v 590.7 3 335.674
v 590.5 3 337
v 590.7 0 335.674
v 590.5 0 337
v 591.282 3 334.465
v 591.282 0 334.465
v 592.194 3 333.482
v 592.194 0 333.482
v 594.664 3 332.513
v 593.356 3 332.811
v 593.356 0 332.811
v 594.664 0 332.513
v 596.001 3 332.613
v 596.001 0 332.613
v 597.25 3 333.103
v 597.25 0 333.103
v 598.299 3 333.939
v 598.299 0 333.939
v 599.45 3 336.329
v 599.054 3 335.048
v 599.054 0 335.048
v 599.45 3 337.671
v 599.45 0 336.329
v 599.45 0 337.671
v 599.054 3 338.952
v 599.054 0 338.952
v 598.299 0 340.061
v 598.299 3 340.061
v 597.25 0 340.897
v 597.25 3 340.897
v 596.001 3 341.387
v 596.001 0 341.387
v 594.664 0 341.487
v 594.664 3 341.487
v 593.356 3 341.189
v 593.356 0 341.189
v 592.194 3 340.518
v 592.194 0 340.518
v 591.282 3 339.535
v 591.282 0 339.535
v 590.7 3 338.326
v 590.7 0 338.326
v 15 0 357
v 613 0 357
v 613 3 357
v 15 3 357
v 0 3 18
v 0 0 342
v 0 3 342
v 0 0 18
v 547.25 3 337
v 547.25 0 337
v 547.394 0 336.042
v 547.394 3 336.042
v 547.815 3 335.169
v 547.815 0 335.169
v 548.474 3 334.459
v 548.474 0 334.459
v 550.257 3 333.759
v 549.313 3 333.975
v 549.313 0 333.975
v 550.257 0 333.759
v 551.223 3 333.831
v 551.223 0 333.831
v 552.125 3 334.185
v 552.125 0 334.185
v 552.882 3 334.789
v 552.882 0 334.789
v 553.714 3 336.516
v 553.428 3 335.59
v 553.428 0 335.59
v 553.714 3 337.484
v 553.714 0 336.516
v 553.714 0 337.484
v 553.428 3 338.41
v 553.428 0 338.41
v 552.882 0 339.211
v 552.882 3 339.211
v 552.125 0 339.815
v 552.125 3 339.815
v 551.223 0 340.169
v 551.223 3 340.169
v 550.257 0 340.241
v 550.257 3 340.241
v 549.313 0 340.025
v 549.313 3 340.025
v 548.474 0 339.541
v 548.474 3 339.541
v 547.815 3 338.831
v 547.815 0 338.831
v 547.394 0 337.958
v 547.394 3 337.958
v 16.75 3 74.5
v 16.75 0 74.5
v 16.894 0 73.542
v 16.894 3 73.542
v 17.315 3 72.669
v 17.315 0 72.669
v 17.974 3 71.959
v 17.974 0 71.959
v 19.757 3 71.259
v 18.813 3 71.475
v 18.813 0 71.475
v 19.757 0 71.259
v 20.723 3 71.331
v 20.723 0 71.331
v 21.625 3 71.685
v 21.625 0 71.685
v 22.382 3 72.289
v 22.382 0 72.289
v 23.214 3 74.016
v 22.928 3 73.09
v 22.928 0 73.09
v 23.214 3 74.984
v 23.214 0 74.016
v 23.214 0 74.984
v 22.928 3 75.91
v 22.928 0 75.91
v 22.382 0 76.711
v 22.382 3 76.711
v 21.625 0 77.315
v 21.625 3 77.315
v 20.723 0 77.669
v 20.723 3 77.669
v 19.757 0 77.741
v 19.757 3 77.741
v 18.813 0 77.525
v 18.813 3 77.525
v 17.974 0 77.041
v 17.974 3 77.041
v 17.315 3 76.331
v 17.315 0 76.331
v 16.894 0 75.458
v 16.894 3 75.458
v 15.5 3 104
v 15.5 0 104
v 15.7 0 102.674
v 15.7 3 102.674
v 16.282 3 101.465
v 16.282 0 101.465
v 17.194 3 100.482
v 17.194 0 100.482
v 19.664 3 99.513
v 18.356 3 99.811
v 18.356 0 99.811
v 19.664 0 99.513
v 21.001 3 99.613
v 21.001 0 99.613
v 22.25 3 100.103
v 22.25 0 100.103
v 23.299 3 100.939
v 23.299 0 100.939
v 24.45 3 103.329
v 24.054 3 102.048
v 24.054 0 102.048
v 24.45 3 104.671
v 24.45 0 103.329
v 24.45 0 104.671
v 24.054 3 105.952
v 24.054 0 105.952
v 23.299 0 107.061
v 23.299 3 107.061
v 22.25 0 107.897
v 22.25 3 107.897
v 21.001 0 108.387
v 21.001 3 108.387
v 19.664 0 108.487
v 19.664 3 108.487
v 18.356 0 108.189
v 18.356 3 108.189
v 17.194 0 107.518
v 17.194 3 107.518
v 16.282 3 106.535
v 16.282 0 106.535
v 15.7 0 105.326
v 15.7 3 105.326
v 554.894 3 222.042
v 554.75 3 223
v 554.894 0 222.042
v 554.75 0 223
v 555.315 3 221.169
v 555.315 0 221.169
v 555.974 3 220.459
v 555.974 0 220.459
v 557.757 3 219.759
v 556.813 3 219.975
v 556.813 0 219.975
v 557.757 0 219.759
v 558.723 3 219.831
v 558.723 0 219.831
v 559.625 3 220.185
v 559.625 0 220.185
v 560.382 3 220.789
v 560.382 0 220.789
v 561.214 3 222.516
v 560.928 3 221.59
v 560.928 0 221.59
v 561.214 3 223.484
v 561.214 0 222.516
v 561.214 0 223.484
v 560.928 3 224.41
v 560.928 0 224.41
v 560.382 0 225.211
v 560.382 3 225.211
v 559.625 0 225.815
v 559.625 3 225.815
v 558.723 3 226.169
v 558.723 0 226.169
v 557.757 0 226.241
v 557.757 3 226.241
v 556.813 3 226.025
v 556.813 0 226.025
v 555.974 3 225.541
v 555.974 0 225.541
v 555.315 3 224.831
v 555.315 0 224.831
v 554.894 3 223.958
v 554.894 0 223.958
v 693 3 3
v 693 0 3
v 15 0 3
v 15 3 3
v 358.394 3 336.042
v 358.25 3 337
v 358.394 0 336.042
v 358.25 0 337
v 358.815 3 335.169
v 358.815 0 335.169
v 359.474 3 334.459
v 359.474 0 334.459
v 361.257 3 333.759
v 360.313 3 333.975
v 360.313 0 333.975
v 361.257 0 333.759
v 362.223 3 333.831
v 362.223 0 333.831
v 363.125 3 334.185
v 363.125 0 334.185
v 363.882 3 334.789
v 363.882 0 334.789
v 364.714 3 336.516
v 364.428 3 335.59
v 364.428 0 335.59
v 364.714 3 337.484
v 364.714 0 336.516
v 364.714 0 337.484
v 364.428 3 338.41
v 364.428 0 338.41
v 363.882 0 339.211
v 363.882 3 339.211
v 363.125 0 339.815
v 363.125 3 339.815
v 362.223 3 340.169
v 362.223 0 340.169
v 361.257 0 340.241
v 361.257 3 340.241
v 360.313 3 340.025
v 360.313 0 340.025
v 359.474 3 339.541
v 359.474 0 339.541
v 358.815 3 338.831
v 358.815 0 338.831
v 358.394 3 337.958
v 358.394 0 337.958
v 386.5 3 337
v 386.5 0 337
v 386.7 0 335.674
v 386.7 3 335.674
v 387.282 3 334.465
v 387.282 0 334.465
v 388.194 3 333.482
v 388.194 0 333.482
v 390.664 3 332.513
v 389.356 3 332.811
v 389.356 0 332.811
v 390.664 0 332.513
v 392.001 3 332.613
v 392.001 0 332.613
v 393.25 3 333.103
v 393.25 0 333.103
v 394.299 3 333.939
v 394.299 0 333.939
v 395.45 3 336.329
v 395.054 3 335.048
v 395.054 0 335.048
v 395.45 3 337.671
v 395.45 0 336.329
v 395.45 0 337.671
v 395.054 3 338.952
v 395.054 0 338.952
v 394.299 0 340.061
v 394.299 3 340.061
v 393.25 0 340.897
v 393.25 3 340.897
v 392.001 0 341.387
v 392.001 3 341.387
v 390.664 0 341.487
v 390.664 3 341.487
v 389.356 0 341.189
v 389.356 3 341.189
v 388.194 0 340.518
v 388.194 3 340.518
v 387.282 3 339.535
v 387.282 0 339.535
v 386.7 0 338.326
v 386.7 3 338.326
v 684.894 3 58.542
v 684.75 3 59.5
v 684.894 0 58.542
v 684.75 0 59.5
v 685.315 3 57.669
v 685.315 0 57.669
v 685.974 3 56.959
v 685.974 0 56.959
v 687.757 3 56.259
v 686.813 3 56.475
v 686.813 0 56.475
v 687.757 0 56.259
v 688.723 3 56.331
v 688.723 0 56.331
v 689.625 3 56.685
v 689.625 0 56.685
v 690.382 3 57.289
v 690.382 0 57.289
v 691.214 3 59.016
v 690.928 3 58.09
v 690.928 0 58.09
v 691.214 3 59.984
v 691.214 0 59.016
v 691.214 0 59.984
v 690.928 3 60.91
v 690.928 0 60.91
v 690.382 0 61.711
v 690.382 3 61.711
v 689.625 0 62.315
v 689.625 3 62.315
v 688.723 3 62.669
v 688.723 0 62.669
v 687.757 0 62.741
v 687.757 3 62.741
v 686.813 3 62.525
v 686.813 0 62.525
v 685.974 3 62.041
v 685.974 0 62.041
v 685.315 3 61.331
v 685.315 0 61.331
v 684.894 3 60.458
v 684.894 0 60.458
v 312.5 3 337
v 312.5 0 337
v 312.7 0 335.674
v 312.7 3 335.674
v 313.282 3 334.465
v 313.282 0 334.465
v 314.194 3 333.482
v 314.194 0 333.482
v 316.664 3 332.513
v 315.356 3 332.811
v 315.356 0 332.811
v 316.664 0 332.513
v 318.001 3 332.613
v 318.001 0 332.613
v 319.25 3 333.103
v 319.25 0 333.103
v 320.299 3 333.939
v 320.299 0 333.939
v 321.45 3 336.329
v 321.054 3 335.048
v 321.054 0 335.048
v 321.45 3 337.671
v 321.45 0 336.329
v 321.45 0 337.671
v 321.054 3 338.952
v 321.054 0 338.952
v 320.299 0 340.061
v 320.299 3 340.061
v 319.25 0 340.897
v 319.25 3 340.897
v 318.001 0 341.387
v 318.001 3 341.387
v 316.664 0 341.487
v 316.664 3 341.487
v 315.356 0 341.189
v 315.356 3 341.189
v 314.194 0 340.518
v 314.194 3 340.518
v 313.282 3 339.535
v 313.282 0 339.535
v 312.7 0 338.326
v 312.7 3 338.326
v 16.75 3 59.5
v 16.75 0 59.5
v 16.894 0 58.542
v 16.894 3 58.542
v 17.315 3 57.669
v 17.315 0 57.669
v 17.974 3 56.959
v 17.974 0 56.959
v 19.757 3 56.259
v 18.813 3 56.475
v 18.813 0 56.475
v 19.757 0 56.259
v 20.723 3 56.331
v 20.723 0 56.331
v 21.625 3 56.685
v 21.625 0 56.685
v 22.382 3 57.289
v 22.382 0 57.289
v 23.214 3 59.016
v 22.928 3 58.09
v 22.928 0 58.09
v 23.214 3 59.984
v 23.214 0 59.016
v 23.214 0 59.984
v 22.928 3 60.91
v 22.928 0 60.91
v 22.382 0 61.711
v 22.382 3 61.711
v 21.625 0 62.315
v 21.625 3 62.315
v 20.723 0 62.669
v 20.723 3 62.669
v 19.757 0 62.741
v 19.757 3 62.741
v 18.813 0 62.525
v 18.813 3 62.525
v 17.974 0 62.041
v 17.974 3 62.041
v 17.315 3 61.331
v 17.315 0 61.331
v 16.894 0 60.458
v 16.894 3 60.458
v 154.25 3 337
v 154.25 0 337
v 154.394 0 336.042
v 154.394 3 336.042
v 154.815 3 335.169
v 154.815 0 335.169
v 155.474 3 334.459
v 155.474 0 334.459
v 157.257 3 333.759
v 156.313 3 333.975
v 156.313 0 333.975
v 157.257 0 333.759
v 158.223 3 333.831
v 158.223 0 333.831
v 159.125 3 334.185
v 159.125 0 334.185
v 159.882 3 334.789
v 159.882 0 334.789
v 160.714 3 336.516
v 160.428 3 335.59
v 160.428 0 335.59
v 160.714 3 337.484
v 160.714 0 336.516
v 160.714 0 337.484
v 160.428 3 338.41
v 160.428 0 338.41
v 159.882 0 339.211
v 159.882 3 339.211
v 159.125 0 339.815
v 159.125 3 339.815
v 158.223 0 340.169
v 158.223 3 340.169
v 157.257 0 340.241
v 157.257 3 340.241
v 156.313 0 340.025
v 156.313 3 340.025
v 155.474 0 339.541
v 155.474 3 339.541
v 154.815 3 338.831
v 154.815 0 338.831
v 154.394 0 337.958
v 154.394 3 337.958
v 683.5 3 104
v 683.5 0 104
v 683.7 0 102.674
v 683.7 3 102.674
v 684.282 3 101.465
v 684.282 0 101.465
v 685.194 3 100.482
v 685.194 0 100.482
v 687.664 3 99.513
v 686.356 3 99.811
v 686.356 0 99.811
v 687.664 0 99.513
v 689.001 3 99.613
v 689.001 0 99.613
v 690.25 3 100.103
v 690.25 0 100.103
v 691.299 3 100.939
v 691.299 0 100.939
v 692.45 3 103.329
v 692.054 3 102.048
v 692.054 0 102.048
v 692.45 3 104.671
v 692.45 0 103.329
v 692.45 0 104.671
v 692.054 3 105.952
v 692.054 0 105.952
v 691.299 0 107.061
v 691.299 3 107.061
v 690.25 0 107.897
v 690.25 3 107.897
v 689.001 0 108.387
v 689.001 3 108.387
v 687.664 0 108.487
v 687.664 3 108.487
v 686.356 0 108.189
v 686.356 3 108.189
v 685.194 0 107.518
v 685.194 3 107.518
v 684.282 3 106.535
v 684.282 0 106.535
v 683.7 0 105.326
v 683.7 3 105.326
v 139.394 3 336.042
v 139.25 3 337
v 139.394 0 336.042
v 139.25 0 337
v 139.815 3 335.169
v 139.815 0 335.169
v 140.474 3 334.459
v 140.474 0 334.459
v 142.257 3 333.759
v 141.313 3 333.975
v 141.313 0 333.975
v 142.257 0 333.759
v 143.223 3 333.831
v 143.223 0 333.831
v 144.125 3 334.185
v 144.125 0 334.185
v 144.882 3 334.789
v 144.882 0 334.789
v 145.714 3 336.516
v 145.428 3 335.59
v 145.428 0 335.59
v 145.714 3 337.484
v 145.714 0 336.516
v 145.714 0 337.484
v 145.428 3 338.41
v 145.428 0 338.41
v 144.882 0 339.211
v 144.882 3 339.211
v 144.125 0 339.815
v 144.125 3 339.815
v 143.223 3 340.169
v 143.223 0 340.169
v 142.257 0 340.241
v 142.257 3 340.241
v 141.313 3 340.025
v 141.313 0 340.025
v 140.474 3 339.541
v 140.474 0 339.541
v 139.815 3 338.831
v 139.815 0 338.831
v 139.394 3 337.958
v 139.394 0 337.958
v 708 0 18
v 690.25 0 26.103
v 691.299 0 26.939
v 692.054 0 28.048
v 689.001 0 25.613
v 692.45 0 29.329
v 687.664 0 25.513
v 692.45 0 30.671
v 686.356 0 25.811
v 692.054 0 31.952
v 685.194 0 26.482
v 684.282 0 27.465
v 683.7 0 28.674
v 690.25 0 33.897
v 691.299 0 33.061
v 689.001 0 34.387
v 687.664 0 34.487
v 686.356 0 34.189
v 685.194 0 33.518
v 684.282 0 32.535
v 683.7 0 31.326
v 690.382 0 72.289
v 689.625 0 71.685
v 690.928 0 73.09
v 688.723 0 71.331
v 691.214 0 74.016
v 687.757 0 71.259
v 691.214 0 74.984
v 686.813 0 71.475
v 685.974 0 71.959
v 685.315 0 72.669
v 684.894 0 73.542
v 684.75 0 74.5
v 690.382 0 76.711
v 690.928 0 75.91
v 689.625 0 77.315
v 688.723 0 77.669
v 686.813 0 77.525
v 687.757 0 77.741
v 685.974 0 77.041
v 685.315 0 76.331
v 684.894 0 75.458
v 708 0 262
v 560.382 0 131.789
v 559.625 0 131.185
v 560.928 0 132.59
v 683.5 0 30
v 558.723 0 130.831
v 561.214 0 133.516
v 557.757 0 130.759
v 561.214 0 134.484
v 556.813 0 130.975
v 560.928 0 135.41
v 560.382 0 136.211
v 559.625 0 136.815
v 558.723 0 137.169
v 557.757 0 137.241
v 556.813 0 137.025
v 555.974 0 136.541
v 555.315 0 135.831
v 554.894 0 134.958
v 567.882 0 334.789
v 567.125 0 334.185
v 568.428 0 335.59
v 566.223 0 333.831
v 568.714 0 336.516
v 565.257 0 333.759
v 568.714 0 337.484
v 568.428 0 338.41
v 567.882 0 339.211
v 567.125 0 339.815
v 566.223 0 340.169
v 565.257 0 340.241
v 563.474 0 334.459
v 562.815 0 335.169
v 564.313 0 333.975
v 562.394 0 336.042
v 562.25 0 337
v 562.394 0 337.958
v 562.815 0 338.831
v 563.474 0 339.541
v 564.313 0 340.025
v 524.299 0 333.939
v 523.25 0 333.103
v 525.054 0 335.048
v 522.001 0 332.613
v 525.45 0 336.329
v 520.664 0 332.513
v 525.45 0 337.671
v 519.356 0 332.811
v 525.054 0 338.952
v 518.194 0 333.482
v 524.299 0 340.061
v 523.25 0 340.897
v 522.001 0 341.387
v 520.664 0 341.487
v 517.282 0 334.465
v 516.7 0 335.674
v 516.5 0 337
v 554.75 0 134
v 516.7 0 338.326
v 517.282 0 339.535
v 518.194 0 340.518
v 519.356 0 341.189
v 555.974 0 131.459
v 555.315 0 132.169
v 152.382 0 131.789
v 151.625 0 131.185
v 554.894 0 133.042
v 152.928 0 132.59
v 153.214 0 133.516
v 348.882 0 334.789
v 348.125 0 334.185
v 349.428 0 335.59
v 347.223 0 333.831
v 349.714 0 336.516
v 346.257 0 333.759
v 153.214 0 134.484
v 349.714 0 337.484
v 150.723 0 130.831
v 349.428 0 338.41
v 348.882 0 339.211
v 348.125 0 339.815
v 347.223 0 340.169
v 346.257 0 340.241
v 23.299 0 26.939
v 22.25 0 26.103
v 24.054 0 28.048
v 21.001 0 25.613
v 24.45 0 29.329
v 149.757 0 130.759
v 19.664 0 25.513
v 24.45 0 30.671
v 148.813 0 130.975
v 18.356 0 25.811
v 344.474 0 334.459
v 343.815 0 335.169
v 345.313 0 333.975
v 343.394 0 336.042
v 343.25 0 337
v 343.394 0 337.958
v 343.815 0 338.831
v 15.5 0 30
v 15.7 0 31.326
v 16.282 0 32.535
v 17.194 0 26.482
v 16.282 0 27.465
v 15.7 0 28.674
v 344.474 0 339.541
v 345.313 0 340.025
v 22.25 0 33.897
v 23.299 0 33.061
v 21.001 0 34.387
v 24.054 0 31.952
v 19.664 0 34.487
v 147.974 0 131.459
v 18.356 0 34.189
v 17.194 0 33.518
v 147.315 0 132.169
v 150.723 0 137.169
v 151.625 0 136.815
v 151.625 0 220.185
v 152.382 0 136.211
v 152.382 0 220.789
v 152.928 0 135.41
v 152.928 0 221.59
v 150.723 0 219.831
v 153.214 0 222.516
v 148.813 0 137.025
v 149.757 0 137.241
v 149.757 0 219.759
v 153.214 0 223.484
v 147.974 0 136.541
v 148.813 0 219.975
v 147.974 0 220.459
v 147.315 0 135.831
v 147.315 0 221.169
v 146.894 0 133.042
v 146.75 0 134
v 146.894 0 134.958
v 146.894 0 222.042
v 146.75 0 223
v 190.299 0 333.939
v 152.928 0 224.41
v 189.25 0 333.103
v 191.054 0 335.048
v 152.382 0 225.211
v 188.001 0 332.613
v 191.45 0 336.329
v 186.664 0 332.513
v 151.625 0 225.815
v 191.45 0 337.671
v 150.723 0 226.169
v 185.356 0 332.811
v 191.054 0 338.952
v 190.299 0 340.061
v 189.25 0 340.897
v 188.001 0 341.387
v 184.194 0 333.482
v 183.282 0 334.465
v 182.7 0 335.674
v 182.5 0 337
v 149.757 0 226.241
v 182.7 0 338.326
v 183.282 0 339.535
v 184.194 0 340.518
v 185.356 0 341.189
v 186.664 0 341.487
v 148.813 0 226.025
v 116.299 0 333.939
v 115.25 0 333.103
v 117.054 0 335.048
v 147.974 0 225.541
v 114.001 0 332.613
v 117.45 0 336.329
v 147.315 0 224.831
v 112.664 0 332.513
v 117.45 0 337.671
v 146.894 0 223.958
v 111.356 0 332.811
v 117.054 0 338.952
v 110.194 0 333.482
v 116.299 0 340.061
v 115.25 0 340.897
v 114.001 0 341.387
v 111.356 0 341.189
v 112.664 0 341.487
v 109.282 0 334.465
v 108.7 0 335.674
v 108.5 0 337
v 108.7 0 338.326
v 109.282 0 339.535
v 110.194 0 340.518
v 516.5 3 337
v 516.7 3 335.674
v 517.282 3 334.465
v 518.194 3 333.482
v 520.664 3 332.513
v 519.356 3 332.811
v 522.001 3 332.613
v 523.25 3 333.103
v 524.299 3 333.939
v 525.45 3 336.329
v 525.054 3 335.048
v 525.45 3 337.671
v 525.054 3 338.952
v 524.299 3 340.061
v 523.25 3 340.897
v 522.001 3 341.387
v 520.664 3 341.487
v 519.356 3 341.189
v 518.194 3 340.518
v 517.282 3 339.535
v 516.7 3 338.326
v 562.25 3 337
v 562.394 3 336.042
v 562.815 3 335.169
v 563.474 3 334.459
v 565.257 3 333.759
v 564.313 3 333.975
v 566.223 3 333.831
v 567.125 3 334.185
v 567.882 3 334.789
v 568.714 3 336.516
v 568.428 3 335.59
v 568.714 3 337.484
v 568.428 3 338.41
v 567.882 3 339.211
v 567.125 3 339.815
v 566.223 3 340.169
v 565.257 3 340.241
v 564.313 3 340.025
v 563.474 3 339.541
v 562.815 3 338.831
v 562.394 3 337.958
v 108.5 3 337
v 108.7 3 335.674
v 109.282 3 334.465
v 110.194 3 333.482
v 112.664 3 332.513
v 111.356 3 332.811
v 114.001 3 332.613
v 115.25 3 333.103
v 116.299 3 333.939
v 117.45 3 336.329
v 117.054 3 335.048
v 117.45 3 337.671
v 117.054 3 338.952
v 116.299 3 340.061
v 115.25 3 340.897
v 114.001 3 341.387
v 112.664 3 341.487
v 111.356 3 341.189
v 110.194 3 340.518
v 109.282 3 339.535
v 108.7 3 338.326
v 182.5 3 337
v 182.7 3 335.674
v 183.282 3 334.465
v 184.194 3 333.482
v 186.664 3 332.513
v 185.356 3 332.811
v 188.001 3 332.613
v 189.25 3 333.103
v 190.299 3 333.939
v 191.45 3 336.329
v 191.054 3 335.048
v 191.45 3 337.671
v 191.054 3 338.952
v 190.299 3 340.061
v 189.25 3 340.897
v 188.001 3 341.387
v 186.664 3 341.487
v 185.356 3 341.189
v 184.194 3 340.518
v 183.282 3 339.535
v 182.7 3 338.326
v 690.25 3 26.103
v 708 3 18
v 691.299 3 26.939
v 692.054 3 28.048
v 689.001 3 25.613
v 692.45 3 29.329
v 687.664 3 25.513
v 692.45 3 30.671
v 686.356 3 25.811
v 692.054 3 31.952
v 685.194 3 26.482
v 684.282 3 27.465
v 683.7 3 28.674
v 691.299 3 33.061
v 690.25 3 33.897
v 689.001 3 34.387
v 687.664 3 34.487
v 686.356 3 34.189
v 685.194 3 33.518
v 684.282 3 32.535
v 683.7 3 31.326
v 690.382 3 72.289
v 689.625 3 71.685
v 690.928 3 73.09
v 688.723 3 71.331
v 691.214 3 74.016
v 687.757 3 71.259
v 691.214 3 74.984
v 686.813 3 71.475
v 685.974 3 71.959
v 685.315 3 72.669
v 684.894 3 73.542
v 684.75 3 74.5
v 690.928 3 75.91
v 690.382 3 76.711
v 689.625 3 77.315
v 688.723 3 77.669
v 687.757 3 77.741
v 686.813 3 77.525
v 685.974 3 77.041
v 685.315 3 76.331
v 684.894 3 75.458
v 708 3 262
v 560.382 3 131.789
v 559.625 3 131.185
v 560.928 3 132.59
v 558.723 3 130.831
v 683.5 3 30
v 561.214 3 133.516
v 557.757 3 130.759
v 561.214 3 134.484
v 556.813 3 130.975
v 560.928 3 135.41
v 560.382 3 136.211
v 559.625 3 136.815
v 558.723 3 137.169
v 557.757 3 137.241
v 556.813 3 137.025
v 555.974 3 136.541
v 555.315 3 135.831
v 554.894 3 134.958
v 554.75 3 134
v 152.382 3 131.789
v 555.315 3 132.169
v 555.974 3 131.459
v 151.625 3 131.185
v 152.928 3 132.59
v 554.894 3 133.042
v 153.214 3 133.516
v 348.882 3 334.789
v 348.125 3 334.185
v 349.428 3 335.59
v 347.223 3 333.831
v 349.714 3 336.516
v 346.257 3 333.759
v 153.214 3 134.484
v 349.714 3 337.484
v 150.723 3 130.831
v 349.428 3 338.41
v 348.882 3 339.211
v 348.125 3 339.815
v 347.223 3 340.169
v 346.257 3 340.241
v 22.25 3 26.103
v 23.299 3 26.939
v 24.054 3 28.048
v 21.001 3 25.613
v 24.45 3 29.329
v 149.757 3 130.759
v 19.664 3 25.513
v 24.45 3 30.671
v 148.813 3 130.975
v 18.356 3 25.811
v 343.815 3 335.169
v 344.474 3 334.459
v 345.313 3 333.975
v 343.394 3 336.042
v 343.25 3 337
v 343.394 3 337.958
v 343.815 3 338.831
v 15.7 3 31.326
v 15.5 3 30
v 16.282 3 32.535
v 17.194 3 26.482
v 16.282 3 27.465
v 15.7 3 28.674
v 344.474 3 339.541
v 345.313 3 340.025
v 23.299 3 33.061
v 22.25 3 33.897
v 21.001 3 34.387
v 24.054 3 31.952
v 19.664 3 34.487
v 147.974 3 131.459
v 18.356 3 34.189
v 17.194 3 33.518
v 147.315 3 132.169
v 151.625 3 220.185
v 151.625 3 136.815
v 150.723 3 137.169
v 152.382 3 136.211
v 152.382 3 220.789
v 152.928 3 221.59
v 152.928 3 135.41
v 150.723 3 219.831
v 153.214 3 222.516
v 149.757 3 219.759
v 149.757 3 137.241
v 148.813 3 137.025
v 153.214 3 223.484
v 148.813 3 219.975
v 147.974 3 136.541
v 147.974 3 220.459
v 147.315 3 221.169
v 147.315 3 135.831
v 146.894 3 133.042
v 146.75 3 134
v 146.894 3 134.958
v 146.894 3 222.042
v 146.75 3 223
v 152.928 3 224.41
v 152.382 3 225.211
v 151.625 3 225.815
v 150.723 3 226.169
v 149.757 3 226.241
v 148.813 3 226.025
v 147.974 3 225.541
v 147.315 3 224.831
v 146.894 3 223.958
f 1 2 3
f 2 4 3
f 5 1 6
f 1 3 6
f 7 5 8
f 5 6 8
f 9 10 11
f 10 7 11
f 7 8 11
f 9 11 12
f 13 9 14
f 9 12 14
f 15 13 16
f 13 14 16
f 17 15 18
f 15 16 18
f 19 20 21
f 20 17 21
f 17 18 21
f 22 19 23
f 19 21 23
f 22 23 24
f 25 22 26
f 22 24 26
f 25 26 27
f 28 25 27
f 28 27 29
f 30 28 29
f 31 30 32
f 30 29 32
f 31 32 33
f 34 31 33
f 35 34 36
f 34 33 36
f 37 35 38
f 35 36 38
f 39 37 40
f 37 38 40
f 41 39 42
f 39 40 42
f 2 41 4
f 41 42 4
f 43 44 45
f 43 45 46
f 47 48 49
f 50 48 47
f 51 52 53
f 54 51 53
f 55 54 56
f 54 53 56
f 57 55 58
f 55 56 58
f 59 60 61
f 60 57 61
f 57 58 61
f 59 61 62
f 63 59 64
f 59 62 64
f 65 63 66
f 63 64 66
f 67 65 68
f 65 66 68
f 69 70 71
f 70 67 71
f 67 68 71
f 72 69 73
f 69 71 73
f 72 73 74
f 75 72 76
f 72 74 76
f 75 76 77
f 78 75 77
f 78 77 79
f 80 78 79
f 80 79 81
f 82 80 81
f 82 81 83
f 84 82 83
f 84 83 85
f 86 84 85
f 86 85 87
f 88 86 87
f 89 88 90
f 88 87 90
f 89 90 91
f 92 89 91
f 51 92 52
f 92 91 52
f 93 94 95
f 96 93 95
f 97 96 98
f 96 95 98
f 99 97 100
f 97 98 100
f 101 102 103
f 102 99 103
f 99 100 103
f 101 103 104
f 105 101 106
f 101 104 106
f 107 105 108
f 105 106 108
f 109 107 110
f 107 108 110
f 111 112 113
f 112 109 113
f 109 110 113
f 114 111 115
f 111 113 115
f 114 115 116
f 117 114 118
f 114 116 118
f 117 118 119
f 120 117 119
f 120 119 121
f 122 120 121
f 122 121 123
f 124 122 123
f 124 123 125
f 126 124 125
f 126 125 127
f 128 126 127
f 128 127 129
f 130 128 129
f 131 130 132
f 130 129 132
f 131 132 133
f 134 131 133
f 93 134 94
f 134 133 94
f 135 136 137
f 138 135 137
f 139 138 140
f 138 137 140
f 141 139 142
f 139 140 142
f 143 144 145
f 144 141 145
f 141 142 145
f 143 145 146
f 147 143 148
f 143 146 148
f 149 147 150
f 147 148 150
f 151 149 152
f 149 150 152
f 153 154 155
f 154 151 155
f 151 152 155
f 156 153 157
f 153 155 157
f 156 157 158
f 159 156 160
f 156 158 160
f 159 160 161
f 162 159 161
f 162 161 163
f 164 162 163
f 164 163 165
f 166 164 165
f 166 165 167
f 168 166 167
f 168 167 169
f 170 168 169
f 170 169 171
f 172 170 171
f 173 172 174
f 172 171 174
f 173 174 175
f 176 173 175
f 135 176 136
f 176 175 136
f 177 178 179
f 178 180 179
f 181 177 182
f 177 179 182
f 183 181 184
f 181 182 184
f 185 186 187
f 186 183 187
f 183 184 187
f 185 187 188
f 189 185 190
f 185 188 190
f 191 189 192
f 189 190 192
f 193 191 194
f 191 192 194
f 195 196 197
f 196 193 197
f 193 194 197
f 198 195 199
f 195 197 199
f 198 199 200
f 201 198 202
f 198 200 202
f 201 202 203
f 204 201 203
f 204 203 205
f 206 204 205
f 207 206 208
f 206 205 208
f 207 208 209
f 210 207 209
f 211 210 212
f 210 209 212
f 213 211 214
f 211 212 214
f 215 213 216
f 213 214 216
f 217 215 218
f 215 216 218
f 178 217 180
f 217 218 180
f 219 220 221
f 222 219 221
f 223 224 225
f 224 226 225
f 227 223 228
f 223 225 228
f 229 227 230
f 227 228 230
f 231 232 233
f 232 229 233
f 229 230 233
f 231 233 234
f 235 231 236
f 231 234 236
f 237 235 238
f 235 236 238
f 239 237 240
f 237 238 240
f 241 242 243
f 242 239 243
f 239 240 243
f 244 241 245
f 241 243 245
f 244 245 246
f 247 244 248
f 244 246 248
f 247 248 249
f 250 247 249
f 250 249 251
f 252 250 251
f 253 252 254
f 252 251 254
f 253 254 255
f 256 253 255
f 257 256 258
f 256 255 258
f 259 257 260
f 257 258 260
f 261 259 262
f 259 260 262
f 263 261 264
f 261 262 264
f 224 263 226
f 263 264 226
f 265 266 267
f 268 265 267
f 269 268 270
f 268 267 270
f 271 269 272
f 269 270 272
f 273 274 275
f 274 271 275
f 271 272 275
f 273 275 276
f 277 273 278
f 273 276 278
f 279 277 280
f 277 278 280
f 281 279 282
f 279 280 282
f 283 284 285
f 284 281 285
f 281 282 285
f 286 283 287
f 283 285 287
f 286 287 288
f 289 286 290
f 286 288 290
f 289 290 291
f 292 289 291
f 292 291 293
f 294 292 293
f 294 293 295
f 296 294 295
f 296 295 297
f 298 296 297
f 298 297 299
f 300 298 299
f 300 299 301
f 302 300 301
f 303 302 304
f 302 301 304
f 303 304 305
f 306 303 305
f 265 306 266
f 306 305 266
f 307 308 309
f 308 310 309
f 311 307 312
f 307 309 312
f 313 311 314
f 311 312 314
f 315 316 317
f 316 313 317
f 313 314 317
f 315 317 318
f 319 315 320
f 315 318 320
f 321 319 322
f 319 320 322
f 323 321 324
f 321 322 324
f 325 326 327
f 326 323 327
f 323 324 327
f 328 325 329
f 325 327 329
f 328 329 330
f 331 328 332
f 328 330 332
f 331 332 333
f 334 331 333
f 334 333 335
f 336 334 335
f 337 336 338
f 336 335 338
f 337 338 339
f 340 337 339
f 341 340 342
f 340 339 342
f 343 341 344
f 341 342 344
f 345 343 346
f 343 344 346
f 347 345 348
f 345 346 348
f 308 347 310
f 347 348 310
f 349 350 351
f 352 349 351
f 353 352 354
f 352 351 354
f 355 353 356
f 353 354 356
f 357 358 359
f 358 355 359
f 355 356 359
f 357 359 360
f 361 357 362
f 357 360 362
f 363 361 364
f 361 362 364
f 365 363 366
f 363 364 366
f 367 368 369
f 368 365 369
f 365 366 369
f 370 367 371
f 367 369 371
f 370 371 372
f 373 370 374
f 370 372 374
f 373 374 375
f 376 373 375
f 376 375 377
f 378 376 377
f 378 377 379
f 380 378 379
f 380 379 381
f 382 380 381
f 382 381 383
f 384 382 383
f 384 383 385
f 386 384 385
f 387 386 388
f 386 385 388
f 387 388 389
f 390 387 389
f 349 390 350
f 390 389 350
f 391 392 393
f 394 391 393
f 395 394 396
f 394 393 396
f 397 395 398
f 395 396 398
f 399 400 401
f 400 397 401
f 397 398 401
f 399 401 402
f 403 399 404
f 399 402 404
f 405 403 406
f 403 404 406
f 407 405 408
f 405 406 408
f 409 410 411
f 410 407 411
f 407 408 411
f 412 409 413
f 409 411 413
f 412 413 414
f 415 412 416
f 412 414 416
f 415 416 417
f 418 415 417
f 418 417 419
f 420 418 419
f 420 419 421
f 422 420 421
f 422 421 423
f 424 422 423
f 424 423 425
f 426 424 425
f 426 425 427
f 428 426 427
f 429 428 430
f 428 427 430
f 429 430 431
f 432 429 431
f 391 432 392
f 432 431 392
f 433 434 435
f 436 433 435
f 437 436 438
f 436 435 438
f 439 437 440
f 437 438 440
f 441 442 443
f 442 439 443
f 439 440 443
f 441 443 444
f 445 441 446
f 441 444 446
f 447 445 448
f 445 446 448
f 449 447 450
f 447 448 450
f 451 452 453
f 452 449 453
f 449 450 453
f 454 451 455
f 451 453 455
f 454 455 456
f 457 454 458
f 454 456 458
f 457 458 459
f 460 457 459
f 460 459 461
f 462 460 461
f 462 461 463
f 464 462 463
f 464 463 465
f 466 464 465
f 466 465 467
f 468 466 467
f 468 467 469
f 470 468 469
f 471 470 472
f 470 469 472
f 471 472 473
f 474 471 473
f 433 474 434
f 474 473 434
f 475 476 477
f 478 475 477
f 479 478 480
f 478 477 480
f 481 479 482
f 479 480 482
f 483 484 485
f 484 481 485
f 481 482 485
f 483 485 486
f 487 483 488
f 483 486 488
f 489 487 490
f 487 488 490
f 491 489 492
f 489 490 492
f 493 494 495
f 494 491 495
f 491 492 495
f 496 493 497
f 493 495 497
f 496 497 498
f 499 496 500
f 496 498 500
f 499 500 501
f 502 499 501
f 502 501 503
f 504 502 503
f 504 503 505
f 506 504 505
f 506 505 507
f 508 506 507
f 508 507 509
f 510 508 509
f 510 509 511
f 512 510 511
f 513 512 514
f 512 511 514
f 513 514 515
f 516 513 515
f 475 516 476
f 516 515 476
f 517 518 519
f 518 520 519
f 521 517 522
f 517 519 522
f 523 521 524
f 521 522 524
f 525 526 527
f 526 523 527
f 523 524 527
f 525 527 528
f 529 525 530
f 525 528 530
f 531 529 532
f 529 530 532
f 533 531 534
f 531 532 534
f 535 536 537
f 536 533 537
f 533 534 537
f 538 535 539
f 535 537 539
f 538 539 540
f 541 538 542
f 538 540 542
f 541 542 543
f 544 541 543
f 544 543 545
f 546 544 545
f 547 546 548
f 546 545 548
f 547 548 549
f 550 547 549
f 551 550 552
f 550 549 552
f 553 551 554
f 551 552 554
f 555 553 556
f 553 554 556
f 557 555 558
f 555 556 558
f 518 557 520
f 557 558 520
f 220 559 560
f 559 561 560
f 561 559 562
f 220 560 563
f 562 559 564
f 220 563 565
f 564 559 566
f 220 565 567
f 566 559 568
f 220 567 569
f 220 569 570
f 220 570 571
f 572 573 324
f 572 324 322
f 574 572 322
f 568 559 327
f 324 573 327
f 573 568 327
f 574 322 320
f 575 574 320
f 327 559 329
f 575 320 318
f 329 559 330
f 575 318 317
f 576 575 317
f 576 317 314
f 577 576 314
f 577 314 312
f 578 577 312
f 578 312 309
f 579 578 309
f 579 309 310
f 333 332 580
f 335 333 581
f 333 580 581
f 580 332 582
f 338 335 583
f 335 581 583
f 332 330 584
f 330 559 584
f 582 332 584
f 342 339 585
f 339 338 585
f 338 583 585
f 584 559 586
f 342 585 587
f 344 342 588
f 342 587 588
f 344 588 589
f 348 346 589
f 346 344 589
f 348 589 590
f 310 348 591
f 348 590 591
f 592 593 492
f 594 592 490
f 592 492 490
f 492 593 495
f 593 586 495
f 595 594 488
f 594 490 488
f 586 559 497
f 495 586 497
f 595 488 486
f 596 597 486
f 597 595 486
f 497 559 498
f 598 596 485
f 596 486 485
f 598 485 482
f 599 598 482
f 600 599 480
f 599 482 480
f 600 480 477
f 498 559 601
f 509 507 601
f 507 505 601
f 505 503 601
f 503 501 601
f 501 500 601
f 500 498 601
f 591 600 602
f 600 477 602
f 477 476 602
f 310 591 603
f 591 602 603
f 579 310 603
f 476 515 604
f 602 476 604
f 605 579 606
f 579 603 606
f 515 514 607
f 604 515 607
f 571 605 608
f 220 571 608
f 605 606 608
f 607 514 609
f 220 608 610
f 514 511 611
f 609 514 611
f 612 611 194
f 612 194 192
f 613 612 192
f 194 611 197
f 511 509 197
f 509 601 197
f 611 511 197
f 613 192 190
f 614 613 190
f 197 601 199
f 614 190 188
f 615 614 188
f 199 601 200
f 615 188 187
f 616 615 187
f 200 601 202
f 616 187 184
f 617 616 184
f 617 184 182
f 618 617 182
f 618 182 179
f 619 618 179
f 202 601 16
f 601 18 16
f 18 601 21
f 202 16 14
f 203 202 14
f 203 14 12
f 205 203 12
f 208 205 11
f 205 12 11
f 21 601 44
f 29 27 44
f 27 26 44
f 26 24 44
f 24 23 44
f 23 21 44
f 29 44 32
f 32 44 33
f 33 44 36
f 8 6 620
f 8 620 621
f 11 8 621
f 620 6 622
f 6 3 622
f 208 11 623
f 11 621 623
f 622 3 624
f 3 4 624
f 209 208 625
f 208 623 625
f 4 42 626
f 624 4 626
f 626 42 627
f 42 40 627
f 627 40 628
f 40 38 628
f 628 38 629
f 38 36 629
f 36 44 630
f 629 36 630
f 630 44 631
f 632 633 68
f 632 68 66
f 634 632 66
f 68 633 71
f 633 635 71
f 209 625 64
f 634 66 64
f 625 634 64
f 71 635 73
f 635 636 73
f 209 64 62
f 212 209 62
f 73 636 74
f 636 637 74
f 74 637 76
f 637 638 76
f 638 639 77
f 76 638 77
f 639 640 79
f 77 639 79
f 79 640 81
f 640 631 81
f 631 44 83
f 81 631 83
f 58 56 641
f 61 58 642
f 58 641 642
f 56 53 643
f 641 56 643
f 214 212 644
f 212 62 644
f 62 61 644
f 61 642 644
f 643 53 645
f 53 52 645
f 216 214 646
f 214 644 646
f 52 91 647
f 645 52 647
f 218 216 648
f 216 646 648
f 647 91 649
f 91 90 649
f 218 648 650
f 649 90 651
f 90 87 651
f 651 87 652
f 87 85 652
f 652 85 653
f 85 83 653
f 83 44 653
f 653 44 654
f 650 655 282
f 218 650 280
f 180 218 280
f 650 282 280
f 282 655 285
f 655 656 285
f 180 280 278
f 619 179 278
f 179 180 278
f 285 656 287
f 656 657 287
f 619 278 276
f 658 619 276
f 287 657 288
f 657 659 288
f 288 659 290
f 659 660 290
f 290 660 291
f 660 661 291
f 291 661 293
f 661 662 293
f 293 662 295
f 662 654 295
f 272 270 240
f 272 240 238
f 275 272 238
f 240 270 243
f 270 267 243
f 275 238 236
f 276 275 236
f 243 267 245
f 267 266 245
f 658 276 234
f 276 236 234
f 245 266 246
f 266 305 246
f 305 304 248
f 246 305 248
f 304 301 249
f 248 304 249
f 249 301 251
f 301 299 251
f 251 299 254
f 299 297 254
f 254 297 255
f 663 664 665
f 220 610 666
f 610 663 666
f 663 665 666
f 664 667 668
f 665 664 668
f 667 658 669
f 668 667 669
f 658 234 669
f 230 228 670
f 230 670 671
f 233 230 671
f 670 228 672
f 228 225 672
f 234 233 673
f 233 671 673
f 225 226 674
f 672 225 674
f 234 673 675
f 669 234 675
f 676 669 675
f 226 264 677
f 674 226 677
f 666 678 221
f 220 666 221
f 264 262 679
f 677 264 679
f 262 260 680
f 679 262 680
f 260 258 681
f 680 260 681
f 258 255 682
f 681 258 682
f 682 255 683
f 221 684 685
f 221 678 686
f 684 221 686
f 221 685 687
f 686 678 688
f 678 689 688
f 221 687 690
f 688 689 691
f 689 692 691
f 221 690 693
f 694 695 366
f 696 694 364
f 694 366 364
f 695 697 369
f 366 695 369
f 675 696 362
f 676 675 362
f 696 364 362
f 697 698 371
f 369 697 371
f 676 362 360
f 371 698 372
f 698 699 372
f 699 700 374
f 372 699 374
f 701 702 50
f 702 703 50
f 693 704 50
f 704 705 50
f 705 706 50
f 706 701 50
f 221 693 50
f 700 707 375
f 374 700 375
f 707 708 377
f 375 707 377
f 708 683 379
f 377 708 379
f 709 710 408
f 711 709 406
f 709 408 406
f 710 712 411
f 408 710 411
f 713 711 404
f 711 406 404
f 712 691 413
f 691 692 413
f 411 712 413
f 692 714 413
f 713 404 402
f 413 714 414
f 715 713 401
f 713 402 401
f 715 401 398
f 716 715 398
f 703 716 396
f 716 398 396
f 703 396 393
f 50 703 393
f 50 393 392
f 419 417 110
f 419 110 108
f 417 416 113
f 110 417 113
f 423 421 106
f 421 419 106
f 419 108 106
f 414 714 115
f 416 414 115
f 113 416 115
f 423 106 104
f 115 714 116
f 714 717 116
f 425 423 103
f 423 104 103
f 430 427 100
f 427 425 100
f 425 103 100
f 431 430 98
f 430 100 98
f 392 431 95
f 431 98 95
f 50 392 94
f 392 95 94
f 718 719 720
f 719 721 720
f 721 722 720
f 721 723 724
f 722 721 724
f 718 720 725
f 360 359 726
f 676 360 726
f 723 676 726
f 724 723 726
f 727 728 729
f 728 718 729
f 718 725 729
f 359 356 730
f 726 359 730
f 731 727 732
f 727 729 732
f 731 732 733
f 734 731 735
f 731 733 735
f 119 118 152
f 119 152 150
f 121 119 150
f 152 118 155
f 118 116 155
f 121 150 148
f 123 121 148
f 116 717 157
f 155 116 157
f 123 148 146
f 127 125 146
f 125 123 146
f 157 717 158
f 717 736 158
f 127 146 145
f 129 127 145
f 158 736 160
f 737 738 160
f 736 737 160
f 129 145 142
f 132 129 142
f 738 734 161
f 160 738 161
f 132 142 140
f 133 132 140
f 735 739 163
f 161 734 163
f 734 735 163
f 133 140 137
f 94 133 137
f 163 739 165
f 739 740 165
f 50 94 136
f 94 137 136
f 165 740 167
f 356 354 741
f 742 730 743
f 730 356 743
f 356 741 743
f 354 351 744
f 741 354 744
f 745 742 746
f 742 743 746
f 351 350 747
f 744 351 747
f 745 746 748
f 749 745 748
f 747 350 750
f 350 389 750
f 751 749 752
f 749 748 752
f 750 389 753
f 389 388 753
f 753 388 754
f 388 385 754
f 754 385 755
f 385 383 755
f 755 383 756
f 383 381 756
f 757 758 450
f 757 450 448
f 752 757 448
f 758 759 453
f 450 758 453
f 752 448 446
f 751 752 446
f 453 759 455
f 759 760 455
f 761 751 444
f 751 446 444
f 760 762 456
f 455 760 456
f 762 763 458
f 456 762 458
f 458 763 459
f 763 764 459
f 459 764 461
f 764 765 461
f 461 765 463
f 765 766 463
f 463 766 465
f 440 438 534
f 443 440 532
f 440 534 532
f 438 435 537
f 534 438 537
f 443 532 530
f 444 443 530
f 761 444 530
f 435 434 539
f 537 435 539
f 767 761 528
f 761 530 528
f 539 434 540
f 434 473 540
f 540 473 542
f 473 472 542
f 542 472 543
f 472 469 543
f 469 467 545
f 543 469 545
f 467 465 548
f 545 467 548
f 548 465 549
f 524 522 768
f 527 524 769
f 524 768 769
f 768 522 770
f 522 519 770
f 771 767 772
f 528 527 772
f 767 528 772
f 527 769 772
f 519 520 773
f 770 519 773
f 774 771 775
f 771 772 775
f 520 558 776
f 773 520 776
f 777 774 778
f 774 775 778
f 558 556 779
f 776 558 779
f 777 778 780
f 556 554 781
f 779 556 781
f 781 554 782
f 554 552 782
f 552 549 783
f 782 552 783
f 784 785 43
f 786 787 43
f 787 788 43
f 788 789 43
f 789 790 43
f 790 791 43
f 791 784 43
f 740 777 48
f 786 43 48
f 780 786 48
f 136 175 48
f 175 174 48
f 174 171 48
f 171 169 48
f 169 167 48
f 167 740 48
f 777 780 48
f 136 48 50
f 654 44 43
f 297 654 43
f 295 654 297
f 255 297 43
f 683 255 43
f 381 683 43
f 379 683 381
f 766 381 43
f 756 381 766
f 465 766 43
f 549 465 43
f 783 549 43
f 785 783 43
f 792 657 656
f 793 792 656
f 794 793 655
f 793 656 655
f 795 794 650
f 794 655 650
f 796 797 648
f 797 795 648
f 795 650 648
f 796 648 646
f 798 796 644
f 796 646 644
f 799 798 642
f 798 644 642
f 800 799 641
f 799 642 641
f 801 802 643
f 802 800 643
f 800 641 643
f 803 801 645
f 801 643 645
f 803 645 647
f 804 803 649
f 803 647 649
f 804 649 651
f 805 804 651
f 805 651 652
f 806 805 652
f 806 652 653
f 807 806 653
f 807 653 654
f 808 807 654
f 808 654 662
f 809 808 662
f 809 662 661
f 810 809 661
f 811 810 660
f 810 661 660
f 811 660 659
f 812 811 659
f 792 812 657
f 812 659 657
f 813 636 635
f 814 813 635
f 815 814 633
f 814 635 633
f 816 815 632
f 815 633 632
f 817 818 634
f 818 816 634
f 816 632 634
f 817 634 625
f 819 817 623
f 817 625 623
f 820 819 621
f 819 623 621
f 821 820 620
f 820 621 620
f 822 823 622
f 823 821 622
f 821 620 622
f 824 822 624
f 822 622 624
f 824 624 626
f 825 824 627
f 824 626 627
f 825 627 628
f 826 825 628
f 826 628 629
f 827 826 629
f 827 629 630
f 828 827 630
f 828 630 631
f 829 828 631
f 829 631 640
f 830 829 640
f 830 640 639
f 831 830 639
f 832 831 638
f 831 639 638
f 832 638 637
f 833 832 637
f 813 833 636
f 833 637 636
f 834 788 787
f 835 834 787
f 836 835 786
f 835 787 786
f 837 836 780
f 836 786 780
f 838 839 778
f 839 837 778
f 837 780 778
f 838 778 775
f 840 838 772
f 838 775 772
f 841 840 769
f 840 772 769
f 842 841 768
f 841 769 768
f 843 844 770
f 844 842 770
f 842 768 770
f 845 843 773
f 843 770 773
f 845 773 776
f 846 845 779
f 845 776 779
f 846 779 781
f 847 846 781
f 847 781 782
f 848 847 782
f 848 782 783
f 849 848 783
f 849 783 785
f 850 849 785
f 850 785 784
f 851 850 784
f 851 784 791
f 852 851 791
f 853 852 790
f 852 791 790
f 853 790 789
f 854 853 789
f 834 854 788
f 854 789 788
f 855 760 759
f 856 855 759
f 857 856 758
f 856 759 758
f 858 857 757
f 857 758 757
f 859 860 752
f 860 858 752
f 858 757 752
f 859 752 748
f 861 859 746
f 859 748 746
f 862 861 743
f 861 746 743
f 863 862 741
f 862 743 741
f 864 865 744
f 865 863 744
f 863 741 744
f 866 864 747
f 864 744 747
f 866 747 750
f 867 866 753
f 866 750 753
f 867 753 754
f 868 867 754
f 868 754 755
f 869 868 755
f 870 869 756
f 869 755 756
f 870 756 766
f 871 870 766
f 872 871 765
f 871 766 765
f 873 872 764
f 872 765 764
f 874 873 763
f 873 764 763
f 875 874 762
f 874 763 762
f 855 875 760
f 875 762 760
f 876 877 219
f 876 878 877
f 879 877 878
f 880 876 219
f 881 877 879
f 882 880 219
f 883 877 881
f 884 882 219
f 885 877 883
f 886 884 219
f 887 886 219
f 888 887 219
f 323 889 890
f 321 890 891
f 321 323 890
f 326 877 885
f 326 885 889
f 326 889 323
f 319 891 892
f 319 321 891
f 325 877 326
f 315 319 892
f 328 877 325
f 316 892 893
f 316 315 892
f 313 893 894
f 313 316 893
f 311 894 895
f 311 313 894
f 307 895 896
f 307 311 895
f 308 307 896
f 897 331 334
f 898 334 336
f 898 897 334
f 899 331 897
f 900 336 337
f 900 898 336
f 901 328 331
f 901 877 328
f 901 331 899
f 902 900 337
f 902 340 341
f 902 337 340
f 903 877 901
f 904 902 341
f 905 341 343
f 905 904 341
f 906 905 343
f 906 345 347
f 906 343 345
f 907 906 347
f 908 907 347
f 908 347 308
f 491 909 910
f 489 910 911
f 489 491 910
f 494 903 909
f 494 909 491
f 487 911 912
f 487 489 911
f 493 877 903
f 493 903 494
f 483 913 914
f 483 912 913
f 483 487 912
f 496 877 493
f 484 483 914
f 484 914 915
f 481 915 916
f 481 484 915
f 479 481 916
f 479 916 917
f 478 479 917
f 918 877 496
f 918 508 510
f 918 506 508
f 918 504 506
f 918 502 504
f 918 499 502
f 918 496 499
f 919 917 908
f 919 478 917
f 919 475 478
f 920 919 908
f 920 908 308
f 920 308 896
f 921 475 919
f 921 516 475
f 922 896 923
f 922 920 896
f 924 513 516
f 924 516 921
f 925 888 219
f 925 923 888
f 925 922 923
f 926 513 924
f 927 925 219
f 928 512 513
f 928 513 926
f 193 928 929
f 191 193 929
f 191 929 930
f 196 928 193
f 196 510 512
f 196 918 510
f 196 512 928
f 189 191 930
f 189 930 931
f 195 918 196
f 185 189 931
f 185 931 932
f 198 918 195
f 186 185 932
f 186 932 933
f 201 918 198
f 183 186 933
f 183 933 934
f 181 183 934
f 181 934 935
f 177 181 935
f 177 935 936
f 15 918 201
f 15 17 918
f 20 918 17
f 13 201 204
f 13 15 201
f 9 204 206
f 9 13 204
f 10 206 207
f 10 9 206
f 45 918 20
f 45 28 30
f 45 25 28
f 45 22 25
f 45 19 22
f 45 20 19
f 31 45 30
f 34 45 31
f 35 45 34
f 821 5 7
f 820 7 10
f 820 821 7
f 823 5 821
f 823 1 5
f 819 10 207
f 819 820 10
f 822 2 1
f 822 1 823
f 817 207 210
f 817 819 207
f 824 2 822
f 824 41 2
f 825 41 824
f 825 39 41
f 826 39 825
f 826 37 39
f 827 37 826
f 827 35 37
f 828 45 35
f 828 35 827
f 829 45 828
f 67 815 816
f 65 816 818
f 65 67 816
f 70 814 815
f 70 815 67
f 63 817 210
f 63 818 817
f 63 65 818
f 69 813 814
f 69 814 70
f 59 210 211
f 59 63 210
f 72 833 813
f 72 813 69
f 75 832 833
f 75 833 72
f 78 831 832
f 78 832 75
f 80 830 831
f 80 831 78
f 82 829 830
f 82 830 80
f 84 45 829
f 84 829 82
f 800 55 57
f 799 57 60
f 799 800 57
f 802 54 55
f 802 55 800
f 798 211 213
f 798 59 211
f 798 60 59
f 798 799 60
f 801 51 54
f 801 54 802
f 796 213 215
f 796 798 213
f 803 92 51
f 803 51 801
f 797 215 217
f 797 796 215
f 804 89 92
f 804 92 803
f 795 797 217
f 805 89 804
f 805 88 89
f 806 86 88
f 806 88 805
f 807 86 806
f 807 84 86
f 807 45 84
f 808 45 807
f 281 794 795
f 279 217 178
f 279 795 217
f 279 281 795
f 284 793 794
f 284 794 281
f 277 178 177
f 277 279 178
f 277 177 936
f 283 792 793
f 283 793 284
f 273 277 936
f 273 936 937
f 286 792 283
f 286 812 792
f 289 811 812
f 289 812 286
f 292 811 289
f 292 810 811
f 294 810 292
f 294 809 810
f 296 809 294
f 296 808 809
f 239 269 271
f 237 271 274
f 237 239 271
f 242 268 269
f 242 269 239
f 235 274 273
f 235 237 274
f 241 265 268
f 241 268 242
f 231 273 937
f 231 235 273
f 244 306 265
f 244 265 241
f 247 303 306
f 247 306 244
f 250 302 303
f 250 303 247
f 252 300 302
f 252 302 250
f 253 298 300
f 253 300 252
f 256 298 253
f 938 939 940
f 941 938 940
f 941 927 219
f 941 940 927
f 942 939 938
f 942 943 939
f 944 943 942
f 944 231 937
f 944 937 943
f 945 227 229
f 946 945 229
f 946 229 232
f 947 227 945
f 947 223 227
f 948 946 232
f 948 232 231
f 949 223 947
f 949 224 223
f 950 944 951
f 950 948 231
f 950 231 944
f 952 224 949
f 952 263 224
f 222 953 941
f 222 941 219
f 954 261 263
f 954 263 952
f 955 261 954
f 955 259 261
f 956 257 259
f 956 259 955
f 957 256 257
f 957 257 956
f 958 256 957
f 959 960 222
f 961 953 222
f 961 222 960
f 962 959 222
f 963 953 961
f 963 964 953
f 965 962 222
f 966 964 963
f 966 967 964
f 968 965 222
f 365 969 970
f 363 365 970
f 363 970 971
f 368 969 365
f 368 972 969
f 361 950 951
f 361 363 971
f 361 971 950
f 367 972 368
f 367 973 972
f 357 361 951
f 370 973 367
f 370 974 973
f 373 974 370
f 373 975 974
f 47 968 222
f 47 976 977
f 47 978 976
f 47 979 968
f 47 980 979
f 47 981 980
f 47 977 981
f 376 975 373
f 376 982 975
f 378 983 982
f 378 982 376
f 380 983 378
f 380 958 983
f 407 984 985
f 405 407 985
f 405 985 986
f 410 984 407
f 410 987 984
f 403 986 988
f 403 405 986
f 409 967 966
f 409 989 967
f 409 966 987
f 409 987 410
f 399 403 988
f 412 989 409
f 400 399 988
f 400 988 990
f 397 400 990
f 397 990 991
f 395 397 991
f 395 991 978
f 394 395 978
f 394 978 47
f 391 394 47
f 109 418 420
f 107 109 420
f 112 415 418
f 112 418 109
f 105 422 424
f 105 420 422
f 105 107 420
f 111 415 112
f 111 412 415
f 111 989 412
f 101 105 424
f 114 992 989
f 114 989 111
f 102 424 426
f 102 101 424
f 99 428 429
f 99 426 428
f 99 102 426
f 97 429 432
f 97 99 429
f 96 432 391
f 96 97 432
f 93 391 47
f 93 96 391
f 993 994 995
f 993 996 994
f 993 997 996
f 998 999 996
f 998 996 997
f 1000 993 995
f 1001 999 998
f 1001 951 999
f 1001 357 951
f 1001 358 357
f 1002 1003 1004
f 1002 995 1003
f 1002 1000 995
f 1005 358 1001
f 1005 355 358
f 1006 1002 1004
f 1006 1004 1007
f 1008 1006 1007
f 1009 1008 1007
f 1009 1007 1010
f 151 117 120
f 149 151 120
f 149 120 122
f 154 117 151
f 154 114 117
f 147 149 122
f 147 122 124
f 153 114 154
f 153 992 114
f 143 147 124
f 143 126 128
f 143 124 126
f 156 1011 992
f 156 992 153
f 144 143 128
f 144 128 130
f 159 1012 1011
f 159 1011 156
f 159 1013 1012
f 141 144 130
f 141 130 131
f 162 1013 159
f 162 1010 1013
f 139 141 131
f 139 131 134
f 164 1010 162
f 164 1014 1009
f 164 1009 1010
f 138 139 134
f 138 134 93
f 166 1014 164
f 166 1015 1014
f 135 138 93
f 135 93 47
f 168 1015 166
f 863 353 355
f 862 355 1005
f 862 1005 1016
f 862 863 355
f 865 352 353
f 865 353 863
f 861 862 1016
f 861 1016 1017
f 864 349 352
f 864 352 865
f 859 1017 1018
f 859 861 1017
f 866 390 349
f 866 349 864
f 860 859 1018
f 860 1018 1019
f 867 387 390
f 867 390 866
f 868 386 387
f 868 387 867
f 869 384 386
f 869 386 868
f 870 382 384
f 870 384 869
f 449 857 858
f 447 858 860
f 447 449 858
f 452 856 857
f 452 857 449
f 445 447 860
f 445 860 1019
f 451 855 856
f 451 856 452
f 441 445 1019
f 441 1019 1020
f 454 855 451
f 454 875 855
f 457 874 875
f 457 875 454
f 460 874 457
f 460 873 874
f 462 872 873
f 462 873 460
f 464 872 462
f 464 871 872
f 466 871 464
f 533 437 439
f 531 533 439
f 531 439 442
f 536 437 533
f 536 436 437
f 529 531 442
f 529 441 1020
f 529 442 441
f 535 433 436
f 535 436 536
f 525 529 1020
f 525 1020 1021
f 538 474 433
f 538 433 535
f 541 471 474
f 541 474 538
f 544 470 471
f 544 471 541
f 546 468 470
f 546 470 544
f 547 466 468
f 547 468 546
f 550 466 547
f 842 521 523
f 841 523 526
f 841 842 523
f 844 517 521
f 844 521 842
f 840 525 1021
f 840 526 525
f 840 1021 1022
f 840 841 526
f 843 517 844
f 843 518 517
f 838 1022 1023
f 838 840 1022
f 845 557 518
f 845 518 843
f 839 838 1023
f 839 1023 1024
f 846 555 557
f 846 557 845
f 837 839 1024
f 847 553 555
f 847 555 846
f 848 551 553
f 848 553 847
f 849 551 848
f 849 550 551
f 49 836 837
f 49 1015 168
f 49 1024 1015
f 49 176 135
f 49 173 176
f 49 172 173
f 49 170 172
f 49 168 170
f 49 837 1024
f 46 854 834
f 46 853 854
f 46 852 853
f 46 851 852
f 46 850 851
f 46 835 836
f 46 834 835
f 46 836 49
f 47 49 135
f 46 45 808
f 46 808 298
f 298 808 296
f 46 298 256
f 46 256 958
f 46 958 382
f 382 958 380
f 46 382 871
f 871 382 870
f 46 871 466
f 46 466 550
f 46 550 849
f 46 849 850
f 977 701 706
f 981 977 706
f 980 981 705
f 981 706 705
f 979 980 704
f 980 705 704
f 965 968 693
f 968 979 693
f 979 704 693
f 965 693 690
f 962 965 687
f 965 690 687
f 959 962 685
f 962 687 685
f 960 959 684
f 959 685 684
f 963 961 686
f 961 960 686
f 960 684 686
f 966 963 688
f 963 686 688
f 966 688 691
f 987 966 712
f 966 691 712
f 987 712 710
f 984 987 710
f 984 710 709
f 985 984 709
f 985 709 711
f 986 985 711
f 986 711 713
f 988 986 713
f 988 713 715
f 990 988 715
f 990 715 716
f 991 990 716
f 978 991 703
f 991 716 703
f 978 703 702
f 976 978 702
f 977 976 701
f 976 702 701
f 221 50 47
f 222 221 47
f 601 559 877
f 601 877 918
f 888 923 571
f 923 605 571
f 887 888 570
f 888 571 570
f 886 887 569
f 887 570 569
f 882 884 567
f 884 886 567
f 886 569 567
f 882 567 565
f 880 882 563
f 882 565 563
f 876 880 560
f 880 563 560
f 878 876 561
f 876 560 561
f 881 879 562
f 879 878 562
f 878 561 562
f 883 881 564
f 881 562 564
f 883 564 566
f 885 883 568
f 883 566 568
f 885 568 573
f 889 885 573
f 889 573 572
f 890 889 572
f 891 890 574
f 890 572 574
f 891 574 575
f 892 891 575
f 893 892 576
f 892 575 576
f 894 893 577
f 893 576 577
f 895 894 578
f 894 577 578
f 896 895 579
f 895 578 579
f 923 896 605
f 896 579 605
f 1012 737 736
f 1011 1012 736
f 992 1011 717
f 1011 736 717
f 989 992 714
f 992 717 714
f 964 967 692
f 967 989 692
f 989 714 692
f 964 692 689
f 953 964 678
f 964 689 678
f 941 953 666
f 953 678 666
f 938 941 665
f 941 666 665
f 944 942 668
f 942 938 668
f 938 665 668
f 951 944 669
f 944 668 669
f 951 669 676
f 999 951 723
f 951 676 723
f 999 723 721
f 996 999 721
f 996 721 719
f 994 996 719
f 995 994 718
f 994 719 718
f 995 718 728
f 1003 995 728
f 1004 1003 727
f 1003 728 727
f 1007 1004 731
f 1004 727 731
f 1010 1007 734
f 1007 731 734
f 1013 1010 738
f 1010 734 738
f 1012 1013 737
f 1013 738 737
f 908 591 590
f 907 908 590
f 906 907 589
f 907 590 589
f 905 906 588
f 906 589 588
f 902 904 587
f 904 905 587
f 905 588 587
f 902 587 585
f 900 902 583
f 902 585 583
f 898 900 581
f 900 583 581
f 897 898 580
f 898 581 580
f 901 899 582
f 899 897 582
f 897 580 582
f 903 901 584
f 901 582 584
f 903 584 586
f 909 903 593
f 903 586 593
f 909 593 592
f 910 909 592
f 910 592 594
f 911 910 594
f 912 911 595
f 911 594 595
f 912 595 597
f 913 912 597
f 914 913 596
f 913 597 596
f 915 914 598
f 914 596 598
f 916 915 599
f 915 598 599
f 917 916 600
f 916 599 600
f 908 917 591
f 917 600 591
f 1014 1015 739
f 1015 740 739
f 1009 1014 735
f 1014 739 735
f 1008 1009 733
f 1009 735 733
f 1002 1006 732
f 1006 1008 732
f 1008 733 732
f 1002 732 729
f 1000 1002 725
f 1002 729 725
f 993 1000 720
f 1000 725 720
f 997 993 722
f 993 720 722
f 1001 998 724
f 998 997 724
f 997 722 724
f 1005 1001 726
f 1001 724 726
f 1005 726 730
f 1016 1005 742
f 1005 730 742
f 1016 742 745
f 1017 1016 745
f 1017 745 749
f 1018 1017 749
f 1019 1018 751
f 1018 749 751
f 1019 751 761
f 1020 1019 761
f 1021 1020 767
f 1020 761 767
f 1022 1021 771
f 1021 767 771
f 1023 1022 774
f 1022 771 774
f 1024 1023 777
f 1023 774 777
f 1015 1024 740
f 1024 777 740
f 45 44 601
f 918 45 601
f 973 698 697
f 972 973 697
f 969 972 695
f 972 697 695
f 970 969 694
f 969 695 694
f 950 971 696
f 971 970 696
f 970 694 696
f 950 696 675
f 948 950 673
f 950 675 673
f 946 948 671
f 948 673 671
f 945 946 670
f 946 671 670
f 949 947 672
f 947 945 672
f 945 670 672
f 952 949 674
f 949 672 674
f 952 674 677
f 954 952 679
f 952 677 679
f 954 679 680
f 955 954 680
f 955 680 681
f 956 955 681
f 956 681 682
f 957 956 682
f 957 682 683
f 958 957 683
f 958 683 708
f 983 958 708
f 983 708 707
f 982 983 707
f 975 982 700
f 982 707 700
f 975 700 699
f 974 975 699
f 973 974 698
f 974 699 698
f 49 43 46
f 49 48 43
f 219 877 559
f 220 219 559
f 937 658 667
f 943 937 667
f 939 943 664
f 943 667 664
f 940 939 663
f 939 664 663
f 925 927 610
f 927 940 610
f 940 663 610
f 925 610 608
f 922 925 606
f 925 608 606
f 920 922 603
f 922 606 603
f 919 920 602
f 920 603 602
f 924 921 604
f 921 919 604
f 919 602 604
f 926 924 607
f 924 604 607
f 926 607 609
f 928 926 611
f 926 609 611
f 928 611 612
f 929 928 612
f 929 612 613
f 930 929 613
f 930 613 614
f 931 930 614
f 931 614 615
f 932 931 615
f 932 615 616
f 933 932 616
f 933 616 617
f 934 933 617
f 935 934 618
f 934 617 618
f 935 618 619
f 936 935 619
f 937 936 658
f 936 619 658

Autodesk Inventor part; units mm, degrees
ref_plane "YZ Plane" through (0, 0, 0) normal (1, 0, 0) x (0, 1, 0)
ref_plane "XZ Plane" through (0, 0, 0) normal (0, 1, 0) x (-1, 0, 0)
ref_plane "XY Plane" through (0, 0, 0) normal (0, 0, 1) x (1, 0, 0)
sketch "Skizze1" plane through (0, 0, 0) normal (0, 1, 0) x (-1, 0, 0)
  line L0 (0, 0) -> (-708, 0)
  line L1 (-708, 0) -> (-708, 357)
  line L2 (-708, 357) -> (0, 357)
  line L3 (0, 357) -> (0, 0)
  line L4 (-354, 0) -> (-354, 357) construction
  line L5 (0, 178.5) -> (-708, 178.5) construction
  line L6 (-150, 0) -> (-150, 357) construction
  line L7 (-558, 0) -> (-558, 357) construction
  line L8 (-708, 67) -> (0, 67) construction
  line L9 (0, 71.4) -> (-708, 71.4) construction
  line L10 (-688, 337) -> (-688, 20) construction
  line L11 (-688, 20) -> (-20, 20) construction
  line L12 (-20, 20) -> (-20, 337) construction
  line L13 (-20, 337) -> (-688, 337) construction
  line L14 (-28, 19.5) -> (-12, 19.5) construction
  line L15 (-12, 19.5) -> (-12, 114.5) construction
  line L16 (-12, 114.5) -> (-28, 114.5) construction
  line L17 (-28, 114.5) -> (-28, 19.5) construction
  line L18 (-28, 19.5) -> (-12, 114.5) construction
  line L19 (-12, 19.5) -> (-28, 114.5) construction
  line L20 (-102.5, 345) -> (-197.5, 345) construction
  line L21 (-197.5, 345) -> (-197.5, 329) construction
  line L22 (-197.5, 329) -> (-102.5, 329) construction
  line L23 (-102.5, 329) -> (-102.5, 345) construction
  line L24 (-102.5, 345) -> (-197.5, 329) construction
  line L25 (-197.5, 345) -> (-102.5, 329) construction
  line L26 (-306.5, 345) -> (-401.5, 345) construction
  line L27 (-401.5, 345) -> (-401.5, 329) construction
  line L28 (-401.5, 329) -> (-306.5, 329) construction
  line L29 (-306.5, 329) -> (-306.5, 345) construction
  line L30 (-306.5, 345) -> (-401.5, 329) construction
  line L31 (-401.5, 345) -> (-306.5, 329) construction
  circle A0 centre (-20, 59.5) radius 3.25
  circle A1 centre (-20, 30) radius 4.5
  circle A2 centre (-20, 74.5) radius 3.25
  circle A3 centre (-20, 104) radius 4.5
  circle A4 centre (-142.5, 337) radius 3.25
  circle A5 centre (-113, 337) radius 4.5
  circle A6 centre (-317, 337) radius 4.5
  circle A7 centre (-346.5, 337) radius 3.25
  circle A8 centre (-157.5, 337) radius 3.25
  circle A9 centre (-187, 337) radius 4.5
  circle A10 centre (-391, 337) radius 4.5
  circle A11 centre (-361.5, 337) radius 3.25
  circle A12 centre (-688, 59.5) radius 3.25
  circle A13 centre (-688, 30) radius 4.5
  circle A14 centre (-688, 104) radius 4.5
  circle A15 centre (-688, 74.5) radius 3.25
  circle A16 centre (-565.5, 337) radius 3.25
  circle A17 centre (-595, 337) radius 4.5
  circle A18 centre (-550.5, 337) radius 3.25
  circle A19 centre (-521, 337) radius 4.5
  circle A20 centre (-150, 134) radius 3.25
  line L32 (-138.5, 124.5) -> (-161.5, 124.5) construction
  line L33 (-161.5, 124.5) -> (-161.5, 232.5) construction
  line L34 (-161.5, 232.5) -> (-138.5, 232.5) construction
  line L35 (-138.5, 232.5) -> (-138.5, 124.5) construction
  line L36 (-138.5, 124.5) -> (-161.5, 232.5) construction
  line L37 (-161.5, 124.5) -> (-138.5, 232.5) construction
  circle A21 centre (-150, 223) radius 3.25
  circle A22 centre (-558, 134) radius 3.25
  circle A23 centre (-558, 223) radius 3.25
  line L38 (-857.6188, 167) -> (175.5187, 167) construction
  line L39 (-857.6403, 142) -> (175.5402, 142) construction
  line L40 (-708, 317) -> (0, 317) construction
  line L41 (-668, 357) -> (-668, 0) construction
  line L42 (-708, 262) -> (-599.5, 262) construction
  line L43 (-613, 357) -> (-613, 217.4879) construction
  line L44 (-613, 357) -> (-708, 262)
  line L45 (-708, 3) -> (0, 3)
  point P0 (-20, 67)
  point P1 (-150, 337)
  point P2 (-354, 337)
  point P3 (-150, 178.5)
  dimension "d0" = 708
  dimension "d1" = 357
  dimension "d2" = 290
  dimension "d3" = 71.4
  dimension "d4" = 150
  dimension "d5" = 150
  dimension "d6" = 20
  dimension "d7" = 16
  dimension "d8" = 95
  dimension "d9" = 95
  dimension "d10" = 16
  dimension "d11" = 95
  dimension "d12" = 16
  dimension "d13" = 6.5
  dimension "d14" = 7.5
  dimension "d15" = 9
  dimension "d16" = 37
  dimension "d17" = 6.5
  dimension "d18" = 9
  dimension "d19" = 7.5
  dimension "d20" = 37
  dimension "d21" = 6.5
  dimension "d22" = 9
  dimension "d23" = 7.5
  dimension "d24" = 37
  dimension "d30" = 6.5
  dimension "d31" = 44.5
  dimension "d32" = 23
  dimension "d33" = 108
  dimension "d34" = 190
  dimension "d35" = 25
  dimension "d36" = 40
  dimension "d37" = 40
  dimension "d47" = 95
  dimension "d48" = 95
  dimension "d49" = 3
extrude "Ex1 mit Z-untermaß" add sketch "Skizze1" along normal blind 3 contours L45 L1 L44 L2 L3
chamfer "Fase1" distance 15 angle 45 3 edges at (0, 1.5, 357) (0, 1.5, 3) (708, 1.5, 3)
equation "\"d3\" = 0.2 * d1"
equation "\"d5\" = d4"
equation "\"d17\" = d13"
equation "\"d18\" = d15"
equation "\"d19\" = d14"
equation "\"d20\" = d16"
equation "\"d21\" = d13"
equation "\"d22\" = d15"
equation "\"d23\" = d14"
equation "\"d24\" = d16"
properties part number "enc-SidePanel 357x708"
